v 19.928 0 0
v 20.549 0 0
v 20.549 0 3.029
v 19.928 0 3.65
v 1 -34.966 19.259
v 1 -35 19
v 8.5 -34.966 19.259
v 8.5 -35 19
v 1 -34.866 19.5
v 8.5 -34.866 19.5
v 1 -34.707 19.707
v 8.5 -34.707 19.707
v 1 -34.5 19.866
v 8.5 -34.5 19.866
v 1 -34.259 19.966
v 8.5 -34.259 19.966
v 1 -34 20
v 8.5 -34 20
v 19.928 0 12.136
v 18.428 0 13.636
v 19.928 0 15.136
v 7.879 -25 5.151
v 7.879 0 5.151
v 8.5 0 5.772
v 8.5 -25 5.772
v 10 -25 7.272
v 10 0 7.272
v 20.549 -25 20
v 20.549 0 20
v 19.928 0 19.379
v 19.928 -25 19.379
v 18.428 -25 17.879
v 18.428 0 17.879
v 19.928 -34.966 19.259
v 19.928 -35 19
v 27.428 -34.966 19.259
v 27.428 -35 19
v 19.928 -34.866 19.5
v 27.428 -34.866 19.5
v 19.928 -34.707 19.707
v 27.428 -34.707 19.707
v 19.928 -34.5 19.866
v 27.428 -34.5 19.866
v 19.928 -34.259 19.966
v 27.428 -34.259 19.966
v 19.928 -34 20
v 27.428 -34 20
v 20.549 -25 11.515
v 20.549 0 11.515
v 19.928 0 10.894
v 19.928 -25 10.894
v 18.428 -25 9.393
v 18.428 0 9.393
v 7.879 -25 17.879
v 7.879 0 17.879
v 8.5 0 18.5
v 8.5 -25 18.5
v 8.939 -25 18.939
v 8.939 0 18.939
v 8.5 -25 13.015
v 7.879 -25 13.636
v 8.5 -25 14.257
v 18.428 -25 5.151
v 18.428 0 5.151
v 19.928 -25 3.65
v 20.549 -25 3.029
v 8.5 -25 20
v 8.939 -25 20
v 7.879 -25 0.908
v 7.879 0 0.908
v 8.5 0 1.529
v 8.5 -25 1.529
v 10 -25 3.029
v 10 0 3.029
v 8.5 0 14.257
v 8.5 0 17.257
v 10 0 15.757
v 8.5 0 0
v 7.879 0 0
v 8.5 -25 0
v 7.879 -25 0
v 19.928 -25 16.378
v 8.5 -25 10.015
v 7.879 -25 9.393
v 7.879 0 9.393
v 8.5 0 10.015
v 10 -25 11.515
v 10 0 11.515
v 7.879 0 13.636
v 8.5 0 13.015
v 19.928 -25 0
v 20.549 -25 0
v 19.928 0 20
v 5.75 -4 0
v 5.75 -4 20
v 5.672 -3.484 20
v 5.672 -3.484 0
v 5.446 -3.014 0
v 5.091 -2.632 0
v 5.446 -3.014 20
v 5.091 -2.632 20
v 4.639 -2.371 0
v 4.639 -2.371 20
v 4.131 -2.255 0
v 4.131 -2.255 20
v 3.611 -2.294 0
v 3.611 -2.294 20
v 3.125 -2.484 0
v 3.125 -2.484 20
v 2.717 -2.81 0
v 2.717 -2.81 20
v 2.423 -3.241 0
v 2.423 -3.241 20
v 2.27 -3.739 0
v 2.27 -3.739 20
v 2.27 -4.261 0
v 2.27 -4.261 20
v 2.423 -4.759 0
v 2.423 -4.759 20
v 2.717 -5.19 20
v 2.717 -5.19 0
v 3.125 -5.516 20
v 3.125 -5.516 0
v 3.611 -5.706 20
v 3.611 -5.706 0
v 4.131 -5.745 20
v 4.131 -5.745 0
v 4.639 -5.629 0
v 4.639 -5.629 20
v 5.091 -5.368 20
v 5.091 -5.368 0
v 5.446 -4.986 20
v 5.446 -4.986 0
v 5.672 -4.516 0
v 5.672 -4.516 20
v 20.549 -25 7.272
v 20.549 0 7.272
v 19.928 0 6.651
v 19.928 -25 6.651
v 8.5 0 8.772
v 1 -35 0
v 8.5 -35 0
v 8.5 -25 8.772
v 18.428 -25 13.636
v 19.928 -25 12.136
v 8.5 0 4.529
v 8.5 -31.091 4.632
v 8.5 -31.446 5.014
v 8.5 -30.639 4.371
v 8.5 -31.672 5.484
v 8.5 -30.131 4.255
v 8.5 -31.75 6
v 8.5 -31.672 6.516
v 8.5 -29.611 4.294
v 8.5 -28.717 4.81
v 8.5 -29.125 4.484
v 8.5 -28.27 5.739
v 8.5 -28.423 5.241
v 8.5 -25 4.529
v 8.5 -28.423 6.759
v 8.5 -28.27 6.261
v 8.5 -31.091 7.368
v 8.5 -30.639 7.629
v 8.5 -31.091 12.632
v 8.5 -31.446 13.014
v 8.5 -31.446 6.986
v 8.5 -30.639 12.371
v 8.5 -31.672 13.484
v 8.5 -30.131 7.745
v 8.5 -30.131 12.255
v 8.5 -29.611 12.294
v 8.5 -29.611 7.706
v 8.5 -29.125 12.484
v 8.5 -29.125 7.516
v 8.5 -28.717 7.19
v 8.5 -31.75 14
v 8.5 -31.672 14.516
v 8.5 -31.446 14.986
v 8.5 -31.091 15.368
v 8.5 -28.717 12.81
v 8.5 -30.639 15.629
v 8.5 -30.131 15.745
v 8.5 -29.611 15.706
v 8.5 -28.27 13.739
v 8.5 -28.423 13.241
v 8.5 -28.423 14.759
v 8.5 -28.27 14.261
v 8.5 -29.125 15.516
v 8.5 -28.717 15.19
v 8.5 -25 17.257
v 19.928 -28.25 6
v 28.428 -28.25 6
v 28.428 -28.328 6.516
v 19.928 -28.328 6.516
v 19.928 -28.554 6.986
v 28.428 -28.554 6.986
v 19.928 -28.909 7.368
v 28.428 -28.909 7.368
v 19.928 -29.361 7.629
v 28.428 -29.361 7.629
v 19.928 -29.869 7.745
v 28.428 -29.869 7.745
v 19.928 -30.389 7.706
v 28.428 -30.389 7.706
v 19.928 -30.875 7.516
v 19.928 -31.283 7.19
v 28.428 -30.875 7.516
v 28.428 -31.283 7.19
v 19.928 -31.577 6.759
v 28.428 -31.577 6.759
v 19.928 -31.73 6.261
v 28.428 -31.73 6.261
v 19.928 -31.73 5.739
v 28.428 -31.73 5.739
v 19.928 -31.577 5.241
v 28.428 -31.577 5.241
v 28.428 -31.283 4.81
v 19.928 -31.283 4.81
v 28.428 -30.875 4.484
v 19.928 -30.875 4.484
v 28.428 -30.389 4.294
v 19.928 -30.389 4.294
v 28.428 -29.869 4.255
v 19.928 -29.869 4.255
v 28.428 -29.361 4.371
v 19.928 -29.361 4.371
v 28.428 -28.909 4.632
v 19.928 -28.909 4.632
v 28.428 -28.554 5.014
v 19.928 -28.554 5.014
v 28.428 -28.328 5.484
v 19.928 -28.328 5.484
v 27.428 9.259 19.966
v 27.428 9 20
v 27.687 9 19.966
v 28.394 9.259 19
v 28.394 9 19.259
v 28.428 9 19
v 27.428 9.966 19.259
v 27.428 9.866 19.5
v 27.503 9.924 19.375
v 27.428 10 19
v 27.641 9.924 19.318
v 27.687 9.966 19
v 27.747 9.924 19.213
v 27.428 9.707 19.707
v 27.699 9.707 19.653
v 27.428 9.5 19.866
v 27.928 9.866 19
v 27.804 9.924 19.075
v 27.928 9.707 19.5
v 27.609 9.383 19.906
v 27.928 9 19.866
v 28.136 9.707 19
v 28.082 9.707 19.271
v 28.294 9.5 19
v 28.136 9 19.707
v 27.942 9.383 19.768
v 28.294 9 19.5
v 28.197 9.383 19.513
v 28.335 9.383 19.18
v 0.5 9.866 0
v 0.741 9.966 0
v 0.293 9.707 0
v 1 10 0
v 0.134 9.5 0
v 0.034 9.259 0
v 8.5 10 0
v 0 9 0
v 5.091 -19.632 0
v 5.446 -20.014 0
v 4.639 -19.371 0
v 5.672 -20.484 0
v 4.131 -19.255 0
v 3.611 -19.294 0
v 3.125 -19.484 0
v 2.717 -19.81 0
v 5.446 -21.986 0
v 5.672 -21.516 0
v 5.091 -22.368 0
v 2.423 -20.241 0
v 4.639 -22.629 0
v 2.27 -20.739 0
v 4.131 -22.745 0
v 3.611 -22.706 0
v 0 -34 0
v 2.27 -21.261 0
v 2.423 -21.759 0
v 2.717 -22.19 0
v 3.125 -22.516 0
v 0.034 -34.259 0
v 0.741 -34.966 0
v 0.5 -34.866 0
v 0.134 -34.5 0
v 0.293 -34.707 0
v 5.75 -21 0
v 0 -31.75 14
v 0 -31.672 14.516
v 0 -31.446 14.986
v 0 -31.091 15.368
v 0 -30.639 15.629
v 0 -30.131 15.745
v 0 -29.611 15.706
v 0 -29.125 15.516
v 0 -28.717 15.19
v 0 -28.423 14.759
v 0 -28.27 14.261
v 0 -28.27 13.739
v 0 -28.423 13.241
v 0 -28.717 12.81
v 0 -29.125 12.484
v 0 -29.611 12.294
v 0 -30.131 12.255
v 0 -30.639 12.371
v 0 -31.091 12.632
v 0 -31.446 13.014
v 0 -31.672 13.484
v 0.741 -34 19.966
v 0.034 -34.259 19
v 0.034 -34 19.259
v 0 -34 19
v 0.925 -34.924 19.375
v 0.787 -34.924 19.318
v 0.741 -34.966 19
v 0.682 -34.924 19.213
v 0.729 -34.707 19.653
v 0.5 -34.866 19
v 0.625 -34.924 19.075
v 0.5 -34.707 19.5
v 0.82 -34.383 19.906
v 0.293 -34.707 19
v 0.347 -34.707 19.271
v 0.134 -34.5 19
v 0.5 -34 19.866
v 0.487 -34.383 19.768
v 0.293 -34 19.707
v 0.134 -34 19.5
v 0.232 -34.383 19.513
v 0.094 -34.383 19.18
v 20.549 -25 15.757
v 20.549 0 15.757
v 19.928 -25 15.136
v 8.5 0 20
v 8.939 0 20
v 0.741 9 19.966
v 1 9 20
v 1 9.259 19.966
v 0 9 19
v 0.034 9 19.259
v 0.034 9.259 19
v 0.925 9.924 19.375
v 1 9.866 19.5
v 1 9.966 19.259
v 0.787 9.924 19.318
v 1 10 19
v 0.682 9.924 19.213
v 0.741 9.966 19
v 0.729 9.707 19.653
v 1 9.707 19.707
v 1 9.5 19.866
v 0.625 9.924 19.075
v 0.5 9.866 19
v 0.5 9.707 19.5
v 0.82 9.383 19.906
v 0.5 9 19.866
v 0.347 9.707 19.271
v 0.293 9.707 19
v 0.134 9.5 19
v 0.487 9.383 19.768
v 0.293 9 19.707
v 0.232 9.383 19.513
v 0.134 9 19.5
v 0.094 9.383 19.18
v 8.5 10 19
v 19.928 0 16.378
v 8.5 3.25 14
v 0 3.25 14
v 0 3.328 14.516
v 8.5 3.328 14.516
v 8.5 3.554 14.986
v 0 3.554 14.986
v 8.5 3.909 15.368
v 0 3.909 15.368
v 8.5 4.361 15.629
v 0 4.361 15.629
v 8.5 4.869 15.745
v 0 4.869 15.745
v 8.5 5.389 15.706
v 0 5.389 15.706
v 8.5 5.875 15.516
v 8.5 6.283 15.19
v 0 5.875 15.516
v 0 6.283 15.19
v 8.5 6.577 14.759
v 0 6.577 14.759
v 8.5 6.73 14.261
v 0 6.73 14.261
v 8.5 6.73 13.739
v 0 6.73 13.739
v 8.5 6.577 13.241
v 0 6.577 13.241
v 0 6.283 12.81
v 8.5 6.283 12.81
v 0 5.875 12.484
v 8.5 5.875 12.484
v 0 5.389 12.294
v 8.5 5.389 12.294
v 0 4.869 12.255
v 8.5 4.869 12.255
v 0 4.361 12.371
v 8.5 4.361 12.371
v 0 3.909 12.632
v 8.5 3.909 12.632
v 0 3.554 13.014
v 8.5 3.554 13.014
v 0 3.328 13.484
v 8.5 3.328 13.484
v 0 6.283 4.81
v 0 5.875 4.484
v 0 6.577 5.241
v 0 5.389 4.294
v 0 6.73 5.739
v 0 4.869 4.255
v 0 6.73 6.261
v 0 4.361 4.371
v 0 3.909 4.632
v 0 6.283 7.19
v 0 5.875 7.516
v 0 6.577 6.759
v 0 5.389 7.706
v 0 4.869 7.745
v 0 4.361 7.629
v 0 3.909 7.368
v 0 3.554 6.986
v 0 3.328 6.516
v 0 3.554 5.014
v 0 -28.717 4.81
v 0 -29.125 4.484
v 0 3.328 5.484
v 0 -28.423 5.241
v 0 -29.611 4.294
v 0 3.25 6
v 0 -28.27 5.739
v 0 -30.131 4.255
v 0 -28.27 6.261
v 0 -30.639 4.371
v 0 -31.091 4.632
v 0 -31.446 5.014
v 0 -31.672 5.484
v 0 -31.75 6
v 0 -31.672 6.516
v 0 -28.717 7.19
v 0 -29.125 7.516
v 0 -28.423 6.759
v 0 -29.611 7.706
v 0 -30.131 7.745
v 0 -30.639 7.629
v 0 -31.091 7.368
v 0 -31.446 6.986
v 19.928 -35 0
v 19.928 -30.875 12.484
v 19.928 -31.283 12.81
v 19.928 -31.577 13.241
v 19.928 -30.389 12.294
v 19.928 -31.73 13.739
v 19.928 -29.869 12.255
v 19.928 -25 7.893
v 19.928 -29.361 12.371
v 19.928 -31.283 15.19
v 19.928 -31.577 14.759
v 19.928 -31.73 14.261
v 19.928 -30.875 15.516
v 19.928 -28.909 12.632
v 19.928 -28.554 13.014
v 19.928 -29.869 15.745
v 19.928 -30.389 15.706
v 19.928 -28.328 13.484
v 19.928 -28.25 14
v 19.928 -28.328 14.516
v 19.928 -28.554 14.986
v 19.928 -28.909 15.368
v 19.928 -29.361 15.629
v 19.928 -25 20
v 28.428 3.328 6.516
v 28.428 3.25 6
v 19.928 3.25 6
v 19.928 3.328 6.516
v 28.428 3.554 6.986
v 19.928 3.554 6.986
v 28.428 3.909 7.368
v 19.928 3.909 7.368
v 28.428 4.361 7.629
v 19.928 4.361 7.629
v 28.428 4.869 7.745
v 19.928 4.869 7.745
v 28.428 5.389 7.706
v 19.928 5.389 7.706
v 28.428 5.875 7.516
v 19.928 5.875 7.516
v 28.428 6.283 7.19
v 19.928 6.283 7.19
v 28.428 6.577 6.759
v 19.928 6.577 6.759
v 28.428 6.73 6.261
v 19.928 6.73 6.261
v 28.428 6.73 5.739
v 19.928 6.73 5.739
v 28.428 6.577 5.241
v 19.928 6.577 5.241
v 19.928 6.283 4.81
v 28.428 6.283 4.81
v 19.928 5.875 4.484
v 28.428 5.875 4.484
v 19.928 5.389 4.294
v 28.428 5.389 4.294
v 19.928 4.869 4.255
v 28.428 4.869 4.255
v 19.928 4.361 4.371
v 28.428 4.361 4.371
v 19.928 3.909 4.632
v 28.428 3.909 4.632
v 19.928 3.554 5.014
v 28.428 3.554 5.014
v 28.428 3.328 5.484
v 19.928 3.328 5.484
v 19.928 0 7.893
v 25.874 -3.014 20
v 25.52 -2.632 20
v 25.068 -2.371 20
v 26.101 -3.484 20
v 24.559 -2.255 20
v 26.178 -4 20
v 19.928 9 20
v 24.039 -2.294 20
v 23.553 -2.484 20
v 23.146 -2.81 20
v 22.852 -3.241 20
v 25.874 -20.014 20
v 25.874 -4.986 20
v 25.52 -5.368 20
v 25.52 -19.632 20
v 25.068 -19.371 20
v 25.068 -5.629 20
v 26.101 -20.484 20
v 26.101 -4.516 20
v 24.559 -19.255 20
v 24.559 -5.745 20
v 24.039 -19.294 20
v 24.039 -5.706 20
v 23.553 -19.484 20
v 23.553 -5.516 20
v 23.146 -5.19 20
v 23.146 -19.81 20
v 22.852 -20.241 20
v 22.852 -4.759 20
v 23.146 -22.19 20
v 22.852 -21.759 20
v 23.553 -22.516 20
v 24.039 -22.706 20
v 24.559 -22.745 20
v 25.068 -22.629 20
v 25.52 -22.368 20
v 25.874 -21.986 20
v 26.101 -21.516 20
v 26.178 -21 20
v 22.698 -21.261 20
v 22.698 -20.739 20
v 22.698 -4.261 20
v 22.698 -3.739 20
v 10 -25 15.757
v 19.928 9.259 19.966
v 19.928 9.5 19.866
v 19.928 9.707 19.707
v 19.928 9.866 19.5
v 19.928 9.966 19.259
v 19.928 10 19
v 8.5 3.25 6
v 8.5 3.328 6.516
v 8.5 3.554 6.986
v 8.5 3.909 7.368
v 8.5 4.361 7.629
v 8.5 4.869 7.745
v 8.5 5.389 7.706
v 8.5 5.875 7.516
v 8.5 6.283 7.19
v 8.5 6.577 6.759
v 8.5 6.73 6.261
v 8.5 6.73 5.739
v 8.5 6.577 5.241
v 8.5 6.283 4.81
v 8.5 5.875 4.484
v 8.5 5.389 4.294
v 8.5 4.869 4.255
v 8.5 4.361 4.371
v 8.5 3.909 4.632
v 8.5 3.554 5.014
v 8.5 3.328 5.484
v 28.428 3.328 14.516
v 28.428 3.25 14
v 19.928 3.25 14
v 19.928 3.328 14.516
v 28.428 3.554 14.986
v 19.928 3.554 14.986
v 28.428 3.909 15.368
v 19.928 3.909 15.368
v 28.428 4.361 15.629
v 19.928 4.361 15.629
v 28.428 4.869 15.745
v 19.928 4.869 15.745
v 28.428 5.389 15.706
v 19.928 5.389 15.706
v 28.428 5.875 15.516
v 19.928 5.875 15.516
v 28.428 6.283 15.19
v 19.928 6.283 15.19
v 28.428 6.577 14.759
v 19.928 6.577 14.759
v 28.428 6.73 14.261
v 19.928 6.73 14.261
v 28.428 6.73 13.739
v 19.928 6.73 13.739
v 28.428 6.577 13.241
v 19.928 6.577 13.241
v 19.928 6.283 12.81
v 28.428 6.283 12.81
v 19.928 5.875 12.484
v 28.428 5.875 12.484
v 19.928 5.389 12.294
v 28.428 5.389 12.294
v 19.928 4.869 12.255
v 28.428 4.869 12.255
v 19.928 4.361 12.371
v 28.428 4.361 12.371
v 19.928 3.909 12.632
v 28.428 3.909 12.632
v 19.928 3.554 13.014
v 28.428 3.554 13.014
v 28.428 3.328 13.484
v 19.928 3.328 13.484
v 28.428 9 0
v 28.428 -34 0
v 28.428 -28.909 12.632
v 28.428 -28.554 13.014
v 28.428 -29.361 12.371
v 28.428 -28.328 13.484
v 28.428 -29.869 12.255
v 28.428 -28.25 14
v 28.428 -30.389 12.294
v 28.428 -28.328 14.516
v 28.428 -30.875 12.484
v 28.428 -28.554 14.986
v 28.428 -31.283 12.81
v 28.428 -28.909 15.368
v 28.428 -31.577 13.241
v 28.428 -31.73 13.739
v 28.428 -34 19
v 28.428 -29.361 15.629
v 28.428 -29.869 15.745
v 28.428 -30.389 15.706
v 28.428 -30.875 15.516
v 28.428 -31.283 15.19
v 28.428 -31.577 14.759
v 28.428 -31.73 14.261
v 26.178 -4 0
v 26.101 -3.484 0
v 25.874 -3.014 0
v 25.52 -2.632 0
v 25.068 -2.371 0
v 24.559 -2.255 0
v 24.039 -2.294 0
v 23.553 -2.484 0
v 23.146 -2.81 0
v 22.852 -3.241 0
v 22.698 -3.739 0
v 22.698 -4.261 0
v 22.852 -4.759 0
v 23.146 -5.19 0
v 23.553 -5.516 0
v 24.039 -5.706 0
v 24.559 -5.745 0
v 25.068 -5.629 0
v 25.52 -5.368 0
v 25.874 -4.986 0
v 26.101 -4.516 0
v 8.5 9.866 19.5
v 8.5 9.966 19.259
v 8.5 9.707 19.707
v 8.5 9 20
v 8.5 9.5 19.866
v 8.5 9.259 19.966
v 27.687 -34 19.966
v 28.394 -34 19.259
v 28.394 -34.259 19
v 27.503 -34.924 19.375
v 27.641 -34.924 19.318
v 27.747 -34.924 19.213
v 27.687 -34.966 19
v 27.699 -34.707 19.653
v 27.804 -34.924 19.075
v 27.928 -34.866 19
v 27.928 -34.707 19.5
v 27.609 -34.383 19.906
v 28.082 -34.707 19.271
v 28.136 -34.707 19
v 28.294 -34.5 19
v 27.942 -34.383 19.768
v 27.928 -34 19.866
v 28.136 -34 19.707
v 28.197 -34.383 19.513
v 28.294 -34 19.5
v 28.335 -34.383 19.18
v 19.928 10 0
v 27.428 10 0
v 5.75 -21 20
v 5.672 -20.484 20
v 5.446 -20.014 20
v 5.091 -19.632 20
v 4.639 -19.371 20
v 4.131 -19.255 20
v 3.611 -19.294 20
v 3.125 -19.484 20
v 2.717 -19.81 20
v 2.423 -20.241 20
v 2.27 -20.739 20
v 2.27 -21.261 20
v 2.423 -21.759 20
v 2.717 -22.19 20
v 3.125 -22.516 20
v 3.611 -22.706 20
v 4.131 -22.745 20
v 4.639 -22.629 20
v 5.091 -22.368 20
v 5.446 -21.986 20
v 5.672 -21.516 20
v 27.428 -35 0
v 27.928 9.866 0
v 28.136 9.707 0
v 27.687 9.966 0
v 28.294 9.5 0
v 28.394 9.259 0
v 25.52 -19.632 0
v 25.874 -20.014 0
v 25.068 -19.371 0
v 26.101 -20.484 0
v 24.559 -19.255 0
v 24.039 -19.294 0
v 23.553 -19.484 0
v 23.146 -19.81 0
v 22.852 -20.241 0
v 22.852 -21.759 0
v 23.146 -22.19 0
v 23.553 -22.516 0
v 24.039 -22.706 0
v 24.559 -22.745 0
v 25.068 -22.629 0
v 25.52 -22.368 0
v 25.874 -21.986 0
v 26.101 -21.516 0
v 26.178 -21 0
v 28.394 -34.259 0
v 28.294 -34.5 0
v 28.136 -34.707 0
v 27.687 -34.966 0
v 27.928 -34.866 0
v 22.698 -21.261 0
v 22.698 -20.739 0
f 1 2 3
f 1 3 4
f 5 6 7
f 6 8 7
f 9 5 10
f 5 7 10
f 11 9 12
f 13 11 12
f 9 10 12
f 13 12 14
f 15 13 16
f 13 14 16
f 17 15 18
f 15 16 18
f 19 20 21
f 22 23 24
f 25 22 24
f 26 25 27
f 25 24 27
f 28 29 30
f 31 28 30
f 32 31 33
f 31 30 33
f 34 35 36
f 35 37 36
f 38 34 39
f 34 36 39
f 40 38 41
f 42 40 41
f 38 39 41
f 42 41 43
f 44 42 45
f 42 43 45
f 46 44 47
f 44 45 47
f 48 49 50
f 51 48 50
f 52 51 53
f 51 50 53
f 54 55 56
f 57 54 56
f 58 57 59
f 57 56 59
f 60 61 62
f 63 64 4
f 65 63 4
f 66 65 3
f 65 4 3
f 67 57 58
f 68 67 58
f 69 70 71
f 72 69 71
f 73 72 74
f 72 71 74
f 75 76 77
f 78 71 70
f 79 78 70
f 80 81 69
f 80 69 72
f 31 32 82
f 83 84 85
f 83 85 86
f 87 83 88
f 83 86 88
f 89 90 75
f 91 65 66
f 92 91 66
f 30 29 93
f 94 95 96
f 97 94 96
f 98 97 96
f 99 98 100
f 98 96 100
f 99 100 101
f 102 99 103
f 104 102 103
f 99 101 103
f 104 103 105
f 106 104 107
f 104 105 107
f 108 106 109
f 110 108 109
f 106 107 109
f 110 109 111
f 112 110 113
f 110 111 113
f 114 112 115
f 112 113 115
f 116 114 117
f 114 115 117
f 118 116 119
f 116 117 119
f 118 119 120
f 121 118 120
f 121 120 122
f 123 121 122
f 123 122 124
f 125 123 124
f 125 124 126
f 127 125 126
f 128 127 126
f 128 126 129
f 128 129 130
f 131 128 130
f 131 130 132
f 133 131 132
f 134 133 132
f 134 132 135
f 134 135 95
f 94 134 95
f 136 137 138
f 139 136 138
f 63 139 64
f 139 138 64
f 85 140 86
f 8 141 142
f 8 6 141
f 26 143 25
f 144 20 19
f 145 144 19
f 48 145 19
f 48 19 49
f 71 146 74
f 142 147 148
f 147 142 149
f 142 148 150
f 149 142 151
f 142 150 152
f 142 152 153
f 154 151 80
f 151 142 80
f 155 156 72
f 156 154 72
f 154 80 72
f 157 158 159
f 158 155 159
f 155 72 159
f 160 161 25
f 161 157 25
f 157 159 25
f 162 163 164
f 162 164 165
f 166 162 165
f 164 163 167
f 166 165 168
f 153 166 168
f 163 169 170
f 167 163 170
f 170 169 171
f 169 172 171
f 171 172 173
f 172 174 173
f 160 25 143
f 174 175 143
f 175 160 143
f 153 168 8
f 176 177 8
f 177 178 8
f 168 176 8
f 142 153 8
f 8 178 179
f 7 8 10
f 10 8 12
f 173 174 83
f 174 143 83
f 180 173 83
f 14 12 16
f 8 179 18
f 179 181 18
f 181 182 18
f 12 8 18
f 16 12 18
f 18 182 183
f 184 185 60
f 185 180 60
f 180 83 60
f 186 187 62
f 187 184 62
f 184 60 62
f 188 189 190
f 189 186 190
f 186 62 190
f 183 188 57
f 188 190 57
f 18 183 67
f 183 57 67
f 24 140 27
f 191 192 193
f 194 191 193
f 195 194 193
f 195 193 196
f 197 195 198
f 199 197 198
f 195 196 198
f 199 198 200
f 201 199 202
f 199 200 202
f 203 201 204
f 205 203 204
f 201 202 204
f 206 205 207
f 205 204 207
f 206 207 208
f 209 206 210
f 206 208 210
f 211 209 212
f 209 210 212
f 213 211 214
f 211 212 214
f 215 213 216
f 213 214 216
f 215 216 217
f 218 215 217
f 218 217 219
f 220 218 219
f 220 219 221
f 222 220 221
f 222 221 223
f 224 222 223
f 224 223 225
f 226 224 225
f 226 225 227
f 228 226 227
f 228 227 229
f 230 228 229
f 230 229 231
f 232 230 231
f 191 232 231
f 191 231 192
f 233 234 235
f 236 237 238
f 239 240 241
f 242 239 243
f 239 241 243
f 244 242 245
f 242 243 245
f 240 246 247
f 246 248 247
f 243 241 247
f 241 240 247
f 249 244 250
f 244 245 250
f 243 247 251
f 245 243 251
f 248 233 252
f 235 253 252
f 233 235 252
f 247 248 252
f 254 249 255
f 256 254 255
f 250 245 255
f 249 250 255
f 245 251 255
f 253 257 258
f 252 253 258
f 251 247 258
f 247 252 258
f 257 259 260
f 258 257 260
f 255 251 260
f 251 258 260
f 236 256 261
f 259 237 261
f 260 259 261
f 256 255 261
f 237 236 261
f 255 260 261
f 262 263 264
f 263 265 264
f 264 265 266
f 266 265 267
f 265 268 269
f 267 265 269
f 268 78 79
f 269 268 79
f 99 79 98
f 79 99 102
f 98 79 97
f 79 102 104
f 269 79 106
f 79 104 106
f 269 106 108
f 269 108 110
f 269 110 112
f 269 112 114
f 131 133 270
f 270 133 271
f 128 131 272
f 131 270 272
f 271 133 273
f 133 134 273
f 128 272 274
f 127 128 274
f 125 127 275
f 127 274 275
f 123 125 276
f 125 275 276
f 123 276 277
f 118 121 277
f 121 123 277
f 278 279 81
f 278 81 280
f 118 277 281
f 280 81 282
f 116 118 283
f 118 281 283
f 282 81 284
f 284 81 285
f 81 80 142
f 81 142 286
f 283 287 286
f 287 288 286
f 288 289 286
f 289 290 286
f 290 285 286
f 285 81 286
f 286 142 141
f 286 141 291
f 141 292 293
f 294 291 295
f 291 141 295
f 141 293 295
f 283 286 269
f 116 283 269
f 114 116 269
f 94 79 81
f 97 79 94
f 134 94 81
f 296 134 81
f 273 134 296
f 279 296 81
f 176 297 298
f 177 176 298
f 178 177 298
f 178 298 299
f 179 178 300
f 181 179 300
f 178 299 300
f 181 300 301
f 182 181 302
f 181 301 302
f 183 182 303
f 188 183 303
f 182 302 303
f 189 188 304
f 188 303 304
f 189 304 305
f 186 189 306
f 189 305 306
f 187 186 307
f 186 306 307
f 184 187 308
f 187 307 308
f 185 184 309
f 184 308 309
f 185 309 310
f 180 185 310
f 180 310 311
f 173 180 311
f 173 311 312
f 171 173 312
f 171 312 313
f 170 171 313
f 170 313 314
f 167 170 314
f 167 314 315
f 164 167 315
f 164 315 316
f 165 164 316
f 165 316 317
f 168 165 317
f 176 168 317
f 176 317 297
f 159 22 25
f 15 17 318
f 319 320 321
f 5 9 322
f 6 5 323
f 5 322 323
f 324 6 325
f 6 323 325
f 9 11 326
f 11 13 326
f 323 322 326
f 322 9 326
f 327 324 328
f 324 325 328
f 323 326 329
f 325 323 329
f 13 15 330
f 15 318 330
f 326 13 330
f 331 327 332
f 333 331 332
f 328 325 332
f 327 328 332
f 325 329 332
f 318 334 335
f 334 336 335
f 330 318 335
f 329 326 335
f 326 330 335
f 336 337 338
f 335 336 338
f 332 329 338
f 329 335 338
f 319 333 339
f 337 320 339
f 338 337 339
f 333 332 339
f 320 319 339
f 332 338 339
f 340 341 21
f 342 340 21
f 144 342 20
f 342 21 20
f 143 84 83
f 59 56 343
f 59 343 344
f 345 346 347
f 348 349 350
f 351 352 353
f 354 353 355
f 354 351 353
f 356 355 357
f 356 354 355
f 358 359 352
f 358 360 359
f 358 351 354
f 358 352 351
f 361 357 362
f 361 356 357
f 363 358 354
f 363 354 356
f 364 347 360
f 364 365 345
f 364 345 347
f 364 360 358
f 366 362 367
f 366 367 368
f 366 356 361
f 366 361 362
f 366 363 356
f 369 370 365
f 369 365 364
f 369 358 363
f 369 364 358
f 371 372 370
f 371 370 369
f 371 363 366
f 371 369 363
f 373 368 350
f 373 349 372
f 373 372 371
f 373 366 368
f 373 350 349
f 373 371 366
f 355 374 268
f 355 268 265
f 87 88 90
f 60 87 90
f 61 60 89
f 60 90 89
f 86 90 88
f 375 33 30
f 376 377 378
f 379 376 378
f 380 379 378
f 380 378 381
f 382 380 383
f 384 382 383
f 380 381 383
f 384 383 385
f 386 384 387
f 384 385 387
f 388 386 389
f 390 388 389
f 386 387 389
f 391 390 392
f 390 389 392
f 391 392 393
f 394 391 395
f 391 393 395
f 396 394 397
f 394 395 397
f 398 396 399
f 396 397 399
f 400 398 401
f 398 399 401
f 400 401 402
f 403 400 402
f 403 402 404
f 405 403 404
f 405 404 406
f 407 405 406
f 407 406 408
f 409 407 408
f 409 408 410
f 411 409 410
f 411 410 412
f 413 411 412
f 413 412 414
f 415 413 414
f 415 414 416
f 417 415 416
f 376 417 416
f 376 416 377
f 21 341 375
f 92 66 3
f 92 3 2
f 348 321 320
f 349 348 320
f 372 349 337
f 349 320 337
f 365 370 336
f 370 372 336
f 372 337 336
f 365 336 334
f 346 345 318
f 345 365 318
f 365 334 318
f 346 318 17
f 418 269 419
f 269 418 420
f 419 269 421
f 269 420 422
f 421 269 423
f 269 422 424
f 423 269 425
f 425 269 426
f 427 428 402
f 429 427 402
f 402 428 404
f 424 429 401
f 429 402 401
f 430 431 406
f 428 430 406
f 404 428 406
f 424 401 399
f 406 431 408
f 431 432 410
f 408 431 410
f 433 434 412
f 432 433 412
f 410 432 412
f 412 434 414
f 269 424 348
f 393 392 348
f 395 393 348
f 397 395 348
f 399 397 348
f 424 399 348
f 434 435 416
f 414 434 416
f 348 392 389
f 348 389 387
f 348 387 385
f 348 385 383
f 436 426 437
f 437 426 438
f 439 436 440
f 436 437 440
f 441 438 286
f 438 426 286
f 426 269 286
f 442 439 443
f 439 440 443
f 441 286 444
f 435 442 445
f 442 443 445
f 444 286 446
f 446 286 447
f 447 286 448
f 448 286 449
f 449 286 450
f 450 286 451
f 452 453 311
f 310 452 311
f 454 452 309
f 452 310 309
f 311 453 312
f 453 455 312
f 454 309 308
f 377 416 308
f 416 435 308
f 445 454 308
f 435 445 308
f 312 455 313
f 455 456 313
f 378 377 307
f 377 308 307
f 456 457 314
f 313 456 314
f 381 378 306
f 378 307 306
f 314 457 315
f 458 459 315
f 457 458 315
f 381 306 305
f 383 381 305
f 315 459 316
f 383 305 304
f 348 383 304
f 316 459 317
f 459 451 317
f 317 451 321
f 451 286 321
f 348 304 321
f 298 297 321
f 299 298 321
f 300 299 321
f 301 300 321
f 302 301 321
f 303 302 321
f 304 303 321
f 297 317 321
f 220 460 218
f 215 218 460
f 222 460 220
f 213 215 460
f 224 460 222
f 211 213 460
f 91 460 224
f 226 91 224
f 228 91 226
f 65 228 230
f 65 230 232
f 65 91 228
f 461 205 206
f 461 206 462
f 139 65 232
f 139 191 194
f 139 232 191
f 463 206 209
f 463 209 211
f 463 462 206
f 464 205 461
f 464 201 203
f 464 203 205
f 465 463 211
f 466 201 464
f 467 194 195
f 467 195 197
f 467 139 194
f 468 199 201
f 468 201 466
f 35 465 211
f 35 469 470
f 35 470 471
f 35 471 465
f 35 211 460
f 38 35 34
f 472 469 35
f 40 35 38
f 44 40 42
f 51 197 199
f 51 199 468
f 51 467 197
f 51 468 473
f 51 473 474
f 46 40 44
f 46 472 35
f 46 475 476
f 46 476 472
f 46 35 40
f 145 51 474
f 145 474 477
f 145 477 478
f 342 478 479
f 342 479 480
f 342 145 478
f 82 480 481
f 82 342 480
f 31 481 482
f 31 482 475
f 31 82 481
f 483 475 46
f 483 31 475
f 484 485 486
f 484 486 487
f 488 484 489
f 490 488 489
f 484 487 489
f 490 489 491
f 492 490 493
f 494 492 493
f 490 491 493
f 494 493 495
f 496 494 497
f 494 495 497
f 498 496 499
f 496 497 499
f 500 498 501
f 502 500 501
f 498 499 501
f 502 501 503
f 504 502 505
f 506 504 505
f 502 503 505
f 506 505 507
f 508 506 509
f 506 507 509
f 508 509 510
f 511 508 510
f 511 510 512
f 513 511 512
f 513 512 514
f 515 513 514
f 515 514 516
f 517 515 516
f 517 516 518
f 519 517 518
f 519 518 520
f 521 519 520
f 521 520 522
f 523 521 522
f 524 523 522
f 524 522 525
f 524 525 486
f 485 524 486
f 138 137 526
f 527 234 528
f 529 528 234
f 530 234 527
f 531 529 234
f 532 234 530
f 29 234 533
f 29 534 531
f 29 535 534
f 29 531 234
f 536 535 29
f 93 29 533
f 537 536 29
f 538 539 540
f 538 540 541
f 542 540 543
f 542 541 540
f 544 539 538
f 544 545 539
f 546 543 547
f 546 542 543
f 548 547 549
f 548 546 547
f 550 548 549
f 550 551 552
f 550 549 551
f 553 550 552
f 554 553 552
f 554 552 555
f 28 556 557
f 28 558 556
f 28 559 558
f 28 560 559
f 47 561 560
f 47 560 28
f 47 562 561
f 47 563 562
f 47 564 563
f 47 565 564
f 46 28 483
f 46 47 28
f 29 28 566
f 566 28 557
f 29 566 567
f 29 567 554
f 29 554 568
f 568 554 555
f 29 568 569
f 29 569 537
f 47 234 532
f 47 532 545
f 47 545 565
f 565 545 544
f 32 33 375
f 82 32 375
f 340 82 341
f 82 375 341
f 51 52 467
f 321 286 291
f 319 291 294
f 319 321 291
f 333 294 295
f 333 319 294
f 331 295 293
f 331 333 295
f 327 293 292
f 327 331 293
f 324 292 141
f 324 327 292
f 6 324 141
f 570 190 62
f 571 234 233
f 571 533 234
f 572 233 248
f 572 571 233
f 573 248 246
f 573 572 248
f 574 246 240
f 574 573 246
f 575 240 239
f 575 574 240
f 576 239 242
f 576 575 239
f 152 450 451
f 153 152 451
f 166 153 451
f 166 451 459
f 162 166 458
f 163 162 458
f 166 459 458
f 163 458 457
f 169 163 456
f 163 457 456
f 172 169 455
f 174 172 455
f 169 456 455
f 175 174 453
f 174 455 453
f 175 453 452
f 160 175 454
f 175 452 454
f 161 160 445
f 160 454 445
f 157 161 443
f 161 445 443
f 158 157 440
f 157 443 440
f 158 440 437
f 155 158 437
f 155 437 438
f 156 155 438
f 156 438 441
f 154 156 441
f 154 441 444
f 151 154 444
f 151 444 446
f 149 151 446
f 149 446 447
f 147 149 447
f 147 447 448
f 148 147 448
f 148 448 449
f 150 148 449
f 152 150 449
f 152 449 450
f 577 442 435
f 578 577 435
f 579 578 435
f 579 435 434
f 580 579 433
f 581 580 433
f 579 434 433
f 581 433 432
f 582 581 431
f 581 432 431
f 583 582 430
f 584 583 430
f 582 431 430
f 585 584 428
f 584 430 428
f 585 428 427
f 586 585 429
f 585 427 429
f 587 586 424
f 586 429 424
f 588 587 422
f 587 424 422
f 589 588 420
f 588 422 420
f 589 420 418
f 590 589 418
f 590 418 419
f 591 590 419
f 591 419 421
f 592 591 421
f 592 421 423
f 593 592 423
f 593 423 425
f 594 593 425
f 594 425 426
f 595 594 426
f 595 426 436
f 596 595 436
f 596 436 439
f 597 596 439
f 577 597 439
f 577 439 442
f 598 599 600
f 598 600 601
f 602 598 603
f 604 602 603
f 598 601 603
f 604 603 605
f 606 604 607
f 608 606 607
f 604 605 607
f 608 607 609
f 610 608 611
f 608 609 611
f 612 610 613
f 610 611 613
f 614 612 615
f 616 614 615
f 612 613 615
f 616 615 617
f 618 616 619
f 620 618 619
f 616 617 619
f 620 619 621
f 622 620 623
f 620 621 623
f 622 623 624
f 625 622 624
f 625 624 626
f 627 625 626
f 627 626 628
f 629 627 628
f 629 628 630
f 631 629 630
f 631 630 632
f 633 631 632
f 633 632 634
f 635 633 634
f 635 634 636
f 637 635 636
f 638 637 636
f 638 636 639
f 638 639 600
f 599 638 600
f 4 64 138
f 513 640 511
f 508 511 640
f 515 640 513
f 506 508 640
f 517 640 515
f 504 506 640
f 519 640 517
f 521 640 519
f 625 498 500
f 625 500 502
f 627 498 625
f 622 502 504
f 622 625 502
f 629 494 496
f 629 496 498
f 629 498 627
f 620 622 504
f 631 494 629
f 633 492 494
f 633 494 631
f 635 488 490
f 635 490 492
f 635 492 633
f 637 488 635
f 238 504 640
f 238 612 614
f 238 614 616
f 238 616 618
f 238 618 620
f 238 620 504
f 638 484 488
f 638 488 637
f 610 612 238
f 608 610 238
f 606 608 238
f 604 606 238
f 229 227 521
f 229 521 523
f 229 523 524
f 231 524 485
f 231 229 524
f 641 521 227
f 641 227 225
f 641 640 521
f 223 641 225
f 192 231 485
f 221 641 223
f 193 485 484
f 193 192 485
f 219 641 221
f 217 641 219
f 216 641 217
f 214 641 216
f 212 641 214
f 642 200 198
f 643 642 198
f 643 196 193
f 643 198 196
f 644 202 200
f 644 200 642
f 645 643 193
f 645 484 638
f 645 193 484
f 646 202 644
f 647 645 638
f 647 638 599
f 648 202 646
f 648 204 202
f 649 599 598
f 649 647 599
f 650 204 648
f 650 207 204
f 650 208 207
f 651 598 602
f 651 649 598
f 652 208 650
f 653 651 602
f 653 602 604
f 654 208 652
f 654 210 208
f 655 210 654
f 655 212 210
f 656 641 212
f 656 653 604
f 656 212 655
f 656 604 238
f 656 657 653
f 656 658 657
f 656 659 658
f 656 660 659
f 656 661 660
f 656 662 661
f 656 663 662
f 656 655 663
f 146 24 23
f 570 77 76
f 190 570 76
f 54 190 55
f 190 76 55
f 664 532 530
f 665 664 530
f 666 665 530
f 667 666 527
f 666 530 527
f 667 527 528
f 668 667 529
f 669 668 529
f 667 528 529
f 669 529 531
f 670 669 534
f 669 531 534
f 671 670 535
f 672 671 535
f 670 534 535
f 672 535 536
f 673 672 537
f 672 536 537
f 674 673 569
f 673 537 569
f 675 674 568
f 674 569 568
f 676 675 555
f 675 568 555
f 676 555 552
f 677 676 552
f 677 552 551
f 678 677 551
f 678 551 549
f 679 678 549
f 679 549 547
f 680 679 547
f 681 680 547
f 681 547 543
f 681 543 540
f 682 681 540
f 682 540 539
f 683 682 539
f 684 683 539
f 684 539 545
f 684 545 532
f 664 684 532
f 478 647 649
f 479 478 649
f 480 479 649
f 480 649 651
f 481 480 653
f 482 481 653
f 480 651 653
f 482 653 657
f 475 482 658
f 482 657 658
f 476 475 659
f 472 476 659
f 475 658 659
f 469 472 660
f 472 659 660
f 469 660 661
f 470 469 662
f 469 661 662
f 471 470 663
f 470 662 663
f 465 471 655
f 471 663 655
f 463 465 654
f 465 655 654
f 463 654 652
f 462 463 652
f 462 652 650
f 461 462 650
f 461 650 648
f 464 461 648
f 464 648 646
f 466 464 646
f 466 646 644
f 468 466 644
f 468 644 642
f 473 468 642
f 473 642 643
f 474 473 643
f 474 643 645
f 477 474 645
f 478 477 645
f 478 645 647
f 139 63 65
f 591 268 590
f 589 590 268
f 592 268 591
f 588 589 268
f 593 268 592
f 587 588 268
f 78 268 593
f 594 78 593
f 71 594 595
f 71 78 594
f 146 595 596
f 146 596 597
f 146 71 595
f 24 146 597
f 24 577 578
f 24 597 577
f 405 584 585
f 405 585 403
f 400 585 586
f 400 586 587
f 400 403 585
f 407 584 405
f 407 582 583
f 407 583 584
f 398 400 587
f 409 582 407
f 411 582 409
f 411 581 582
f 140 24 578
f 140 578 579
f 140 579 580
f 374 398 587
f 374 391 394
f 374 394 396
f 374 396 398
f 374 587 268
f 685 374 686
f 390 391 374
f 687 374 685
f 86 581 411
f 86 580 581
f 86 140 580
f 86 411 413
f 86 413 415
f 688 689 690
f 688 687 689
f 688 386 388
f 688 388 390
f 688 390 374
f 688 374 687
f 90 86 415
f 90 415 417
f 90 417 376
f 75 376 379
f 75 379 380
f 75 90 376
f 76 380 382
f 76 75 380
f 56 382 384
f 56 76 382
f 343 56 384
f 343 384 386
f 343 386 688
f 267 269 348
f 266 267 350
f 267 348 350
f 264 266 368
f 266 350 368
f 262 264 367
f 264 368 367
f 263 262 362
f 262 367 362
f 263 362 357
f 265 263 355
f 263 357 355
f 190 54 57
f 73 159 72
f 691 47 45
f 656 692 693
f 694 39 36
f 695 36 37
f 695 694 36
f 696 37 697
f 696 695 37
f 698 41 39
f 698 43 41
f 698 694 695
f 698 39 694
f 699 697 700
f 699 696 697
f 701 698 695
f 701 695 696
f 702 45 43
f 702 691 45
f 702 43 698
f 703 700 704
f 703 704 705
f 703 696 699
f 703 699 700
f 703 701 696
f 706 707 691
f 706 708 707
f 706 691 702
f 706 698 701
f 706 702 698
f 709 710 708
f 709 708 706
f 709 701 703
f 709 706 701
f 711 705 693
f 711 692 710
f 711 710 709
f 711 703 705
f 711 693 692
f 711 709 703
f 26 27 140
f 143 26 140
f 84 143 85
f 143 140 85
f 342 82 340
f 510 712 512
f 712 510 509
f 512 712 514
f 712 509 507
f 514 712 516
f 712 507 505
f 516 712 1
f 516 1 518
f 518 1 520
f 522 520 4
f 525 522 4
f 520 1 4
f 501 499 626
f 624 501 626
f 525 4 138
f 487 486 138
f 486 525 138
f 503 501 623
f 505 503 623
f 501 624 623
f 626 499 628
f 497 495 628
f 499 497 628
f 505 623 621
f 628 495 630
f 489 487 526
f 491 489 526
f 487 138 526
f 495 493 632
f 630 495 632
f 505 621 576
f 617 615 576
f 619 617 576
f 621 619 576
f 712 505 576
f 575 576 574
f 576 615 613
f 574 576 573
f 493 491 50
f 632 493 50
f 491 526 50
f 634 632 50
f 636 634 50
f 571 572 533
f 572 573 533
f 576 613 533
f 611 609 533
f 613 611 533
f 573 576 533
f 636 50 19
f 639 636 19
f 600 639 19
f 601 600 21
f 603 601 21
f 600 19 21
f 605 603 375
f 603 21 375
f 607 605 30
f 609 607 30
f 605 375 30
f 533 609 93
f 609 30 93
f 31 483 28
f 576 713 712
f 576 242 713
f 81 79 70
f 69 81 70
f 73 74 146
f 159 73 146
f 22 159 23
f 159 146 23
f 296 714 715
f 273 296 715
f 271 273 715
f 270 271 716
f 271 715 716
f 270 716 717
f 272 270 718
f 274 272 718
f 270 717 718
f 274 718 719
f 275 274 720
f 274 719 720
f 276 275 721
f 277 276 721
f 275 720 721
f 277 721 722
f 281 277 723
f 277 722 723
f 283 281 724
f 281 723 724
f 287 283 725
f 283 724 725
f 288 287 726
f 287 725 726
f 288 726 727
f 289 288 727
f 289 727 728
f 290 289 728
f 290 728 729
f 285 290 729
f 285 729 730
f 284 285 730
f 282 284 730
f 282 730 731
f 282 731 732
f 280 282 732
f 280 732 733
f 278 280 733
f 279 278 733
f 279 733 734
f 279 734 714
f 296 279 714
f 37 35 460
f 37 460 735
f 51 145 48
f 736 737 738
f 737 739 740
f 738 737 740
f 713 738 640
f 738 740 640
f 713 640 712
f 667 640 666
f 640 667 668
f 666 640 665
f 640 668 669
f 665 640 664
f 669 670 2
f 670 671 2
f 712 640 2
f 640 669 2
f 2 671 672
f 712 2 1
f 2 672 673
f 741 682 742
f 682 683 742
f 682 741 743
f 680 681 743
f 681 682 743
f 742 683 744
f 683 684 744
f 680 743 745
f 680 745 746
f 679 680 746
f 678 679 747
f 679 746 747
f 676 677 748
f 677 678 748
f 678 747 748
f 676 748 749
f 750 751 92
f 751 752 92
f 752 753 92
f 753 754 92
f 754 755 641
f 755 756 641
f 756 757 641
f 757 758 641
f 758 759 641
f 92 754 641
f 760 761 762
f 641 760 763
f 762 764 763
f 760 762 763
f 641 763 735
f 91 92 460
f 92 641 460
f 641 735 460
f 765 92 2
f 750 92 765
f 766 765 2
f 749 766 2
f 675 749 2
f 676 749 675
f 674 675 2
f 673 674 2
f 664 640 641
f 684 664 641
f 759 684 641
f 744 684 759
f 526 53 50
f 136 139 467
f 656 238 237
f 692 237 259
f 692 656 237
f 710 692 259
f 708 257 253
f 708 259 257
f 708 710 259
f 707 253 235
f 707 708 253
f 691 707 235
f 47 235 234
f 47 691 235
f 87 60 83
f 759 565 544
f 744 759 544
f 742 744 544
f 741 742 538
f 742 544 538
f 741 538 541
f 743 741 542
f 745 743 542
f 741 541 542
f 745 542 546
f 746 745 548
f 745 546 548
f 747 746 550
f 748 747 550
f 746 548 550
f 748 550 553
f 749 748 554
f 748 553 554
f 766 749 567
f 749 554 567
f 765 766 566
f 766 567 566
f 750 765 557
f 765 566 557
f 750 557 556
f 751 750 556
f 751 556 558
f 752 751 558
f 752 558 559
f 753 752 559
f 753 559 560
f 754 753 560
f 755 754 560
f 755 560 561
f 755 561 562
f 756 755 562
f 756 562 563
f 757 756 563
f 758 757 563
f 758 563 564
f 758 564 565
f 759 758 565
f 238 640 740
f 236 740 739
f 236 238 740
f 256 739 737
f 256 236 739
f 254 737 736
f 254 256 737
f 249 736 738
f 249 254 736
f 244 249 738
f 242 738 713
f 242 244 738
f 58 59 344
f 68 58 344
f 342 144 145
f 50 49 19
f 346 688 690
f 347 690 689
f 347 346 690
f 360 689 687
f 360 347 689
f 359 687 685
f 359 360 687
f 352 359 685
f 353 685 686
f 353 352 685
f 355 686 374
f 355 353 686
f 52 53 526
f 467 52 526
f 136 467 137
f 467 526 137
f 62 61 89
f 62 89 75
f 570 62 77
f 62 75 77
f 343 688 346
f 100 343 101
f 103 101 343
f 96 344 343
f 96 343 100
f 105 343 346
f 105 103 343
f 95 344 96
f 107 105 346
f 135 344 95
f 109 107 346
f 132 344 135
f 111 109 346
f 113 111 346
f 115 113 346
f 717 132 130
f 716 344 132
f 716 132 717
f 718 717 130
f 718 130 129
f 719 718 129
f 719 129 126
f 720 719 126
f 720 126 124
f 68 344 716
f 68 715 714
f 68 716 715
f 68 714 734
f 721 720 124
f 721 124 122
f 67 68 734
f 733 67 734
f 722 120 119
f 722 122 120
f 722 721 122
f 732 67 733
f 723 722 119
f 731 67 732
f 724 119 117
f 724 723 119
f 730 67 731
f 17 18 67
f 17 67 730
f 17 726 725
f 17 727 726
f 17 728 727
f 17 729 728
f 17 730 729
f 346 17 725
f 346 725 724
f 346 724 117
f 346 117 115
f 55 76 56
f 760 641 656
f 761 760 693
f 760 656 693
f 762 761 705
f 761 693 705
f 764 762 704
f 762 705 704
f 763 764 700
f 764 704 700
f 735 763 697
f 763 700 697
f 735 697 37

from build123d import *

# Parameters (mm, degrees)
F1_DEPTH  = 25
F2_W      = 8.5
F2_H      = 20
F3_DEPTH  = 10
F4_W      = 8.5
F4_H      = 20
F5_DEPTH  = 10
F6_R      = 1.75
F7_DEPTH  = 35
F8_R      = 1.75
F9_DEPTH  = 25
F10_R     = 1.75
F11_DEPTH = 13.2
F12_R     = 1.75
F13_DEPTH = 25
F14_R     = 1.75
F15_DEPTH = 25
F18_R     = 1
F18_2_R   = 1


with BuildPart() as f1:
    # F0 (on Front) → F1 (new body)
    with BuildSketch(Plane.XZ):
        Polygon((0, 20), (0, 0), (7.8786796564, 0), (7.8786796564, 0.908116908), (10, 3.0294372515), (7.8786796564, 5.1507575951), (10, 7.2720779386), (7.8786796564, 9.3933982822), (10, 11.5147186258), (7.8786796564, 13.6360389693), (10, 15.7573593129), (7.8786796564, 17.8786796564), (8.9393398282, 18.9393398282), (8.9393398282, 20), align=None)
    extrude(amount=F1_DEPTH)

    # F12 (on face) → F13 (cut)
    with BuildSketch(Plane.XY.offset(20)):
        with Locations((4, -4)):
            Circle(F12_R)
        with Locations((4, -21)):
            Circle(F12_R)
    extrude(amount=-F13_DEPTH, mode=Mode.SUBTRACT)


with BuildPart() as f1b:
    # F0 (on Front) → F1, piece 2 (new body)
    with BuildSketch(Plane.XZ):
        Polygon((20.5494001589, 3.0294372515), (20.5494001589, 0), (28.4284001589, 0), (28.4284001589, 20), (20.5494001589, 20), (18.4280798153, 17.8786796564), (20.5494001589, 15.7573593129), (18.4280798153, 13.6360389693), (20.5494001589, 11.5147186258), (18.4280798153, 9.3933982822), (20.5494001589, 7.2720779386), (18.4280798153, 5.1507575951), align=None)
    extrude(amount=F1_DEPTH)

    # F14 (on face) → F15 (cut)
    with BuildSketch(Plane.XY.offset(20)):
        with Locations((24.4284001589, -4)):
            Circle(F14_R)
        with Locations((24.4284001589, -21)):
            Circle(F14_R)
    extrude(amount=-F15_DEPTH, mode=Mode.SUBTRACT)


with BuildPart() as f3:
    # F2 (on face) → F3 (new body)
    with BuildSketch(Plane.XZ.offset(25)):
        with Locations((24.1784001589, 10)):
            Rectangle(F2_W, F2_H)
    extrude(amount=F3_DEPTH)

    # F10 (on face) → F11 (cut)
    with BuildSketch(Plane.YZ.offset(28.4284001589)):
        with Locations((-30, 14)):
            Circle(F10_R)
        with Locations((-30, 6)):
            Circle(F10_R)
        with Locations((5, 14)):
            Circle(F10_R)
        with Locations((5, 6)):
            Circle(F10_R)
    extrude(amount=-F11_DEPTH, mode=Mode.SUBTRACT)


with BuildPart() as f3b:
    # F2 (on face) → F3, piece 2 (new body)
    with BuildSketch(Plane.XZ.offset(25)):
        with Locations((4.25, 10)):
            Rectangle(F2_W, F2_H)
    extrude(amount=F3_DEPTH)

    # F8 (on face) → F9 (cut)
    with BuildSketch(Plane(origin=(0, 0, 0), x_dir=(0, -1, 0), z_dir=(-1, 0, 0))):
        with Locations((30, 14)):
            Circle(F8_R)
        with Locations((30, 6)):
            Circle(F8_R)
    extrude(amount=-F9_DEPTH, mode=Mode.SUBTRACT)


with BuildPart() as f5:
    # F4 (on face) → F5 (new body)
    with BuildSketch(Plane(origin=(0, 0, 0), x_dir=(-1, 0, 0), z_dir=(0, 1, 0))):
        with Locations((-24.1784001589, 10)):
            Rectangle(F4_W, F4_H)
    extrude(amount=F5_DEPTH)


with BuildPart() as f5b:
    # F4 (on face) → F5, piece 2 (new body)
    with BuildSketch(Plane(origin=(0, 0, 0), x_dir=(-1, 0, 0), z_dir=(0, 1, 0))):
        with Locations((-4.25, 10)):
            Rectangle(F4_W, F4_H)
    extrude(amount=F5_DEPTH)


with BuildPart() as f7_tool:
    # F6 (on face) → F7 (new body)
    with BuildSketch(Plane(origin=(0, 0, 0), x_dir=(0, -1, 0), z_dir=(-1, 0, 0))):
        with Locations((-5, 14)):
            Circle(F6_R)
        with Locations((-5, 6)):
            Circle(F6_R)
    extrude(amount=-F7_DEPTH)


with BuildPart() as f5_1:
    add(f5.part)

    # F7: cut by f7_tool
    add(f7_tool.part, mode=Mode.SUBTRACT)


with BuildPart() as f5b_1:
    add(f5b.part)

    # F7: cut by f7_tool
    add(f7_tool.part, mode=Mode.SUBTRACT)


with BuildPart() as f3b_1:
    add(f3b.part)

    # F16: union F1, F5b
    add(f1.part)
    add(f5b_1.part)

    # F18
    f18_edges = [f3b_1.edges().sort_by_distance(p)[0] for p in [
        (0, -12.5, 20),
        (4.25, 10, 20),
        (4.25, -35, 20),
        (0, 10, 10),
        (0, -35, 10),
    ]]
    fillet(f18_edges, radius=F18_R)


with BuildPart() as f3_1:
    add(f3.part)

    # F17: union F1b, F5
    add(f1b.part)
    add(f5_1.part)

    # F18#2
    f18_2_edges = [f3_1.edges().sort_by_distance(p)[0] for p in [
        (28.4284, -12.5, 20),
        (24.1784, -35, 20),
        (24.1784, 10, 20),
        (28.4284, 10, 10),
        (28.4284, -35, 10),
    ]]
    fillet(f18_2_edges, radius=F18_2_R)


solid = Compound([f3b_1.part, f3_1.part])
